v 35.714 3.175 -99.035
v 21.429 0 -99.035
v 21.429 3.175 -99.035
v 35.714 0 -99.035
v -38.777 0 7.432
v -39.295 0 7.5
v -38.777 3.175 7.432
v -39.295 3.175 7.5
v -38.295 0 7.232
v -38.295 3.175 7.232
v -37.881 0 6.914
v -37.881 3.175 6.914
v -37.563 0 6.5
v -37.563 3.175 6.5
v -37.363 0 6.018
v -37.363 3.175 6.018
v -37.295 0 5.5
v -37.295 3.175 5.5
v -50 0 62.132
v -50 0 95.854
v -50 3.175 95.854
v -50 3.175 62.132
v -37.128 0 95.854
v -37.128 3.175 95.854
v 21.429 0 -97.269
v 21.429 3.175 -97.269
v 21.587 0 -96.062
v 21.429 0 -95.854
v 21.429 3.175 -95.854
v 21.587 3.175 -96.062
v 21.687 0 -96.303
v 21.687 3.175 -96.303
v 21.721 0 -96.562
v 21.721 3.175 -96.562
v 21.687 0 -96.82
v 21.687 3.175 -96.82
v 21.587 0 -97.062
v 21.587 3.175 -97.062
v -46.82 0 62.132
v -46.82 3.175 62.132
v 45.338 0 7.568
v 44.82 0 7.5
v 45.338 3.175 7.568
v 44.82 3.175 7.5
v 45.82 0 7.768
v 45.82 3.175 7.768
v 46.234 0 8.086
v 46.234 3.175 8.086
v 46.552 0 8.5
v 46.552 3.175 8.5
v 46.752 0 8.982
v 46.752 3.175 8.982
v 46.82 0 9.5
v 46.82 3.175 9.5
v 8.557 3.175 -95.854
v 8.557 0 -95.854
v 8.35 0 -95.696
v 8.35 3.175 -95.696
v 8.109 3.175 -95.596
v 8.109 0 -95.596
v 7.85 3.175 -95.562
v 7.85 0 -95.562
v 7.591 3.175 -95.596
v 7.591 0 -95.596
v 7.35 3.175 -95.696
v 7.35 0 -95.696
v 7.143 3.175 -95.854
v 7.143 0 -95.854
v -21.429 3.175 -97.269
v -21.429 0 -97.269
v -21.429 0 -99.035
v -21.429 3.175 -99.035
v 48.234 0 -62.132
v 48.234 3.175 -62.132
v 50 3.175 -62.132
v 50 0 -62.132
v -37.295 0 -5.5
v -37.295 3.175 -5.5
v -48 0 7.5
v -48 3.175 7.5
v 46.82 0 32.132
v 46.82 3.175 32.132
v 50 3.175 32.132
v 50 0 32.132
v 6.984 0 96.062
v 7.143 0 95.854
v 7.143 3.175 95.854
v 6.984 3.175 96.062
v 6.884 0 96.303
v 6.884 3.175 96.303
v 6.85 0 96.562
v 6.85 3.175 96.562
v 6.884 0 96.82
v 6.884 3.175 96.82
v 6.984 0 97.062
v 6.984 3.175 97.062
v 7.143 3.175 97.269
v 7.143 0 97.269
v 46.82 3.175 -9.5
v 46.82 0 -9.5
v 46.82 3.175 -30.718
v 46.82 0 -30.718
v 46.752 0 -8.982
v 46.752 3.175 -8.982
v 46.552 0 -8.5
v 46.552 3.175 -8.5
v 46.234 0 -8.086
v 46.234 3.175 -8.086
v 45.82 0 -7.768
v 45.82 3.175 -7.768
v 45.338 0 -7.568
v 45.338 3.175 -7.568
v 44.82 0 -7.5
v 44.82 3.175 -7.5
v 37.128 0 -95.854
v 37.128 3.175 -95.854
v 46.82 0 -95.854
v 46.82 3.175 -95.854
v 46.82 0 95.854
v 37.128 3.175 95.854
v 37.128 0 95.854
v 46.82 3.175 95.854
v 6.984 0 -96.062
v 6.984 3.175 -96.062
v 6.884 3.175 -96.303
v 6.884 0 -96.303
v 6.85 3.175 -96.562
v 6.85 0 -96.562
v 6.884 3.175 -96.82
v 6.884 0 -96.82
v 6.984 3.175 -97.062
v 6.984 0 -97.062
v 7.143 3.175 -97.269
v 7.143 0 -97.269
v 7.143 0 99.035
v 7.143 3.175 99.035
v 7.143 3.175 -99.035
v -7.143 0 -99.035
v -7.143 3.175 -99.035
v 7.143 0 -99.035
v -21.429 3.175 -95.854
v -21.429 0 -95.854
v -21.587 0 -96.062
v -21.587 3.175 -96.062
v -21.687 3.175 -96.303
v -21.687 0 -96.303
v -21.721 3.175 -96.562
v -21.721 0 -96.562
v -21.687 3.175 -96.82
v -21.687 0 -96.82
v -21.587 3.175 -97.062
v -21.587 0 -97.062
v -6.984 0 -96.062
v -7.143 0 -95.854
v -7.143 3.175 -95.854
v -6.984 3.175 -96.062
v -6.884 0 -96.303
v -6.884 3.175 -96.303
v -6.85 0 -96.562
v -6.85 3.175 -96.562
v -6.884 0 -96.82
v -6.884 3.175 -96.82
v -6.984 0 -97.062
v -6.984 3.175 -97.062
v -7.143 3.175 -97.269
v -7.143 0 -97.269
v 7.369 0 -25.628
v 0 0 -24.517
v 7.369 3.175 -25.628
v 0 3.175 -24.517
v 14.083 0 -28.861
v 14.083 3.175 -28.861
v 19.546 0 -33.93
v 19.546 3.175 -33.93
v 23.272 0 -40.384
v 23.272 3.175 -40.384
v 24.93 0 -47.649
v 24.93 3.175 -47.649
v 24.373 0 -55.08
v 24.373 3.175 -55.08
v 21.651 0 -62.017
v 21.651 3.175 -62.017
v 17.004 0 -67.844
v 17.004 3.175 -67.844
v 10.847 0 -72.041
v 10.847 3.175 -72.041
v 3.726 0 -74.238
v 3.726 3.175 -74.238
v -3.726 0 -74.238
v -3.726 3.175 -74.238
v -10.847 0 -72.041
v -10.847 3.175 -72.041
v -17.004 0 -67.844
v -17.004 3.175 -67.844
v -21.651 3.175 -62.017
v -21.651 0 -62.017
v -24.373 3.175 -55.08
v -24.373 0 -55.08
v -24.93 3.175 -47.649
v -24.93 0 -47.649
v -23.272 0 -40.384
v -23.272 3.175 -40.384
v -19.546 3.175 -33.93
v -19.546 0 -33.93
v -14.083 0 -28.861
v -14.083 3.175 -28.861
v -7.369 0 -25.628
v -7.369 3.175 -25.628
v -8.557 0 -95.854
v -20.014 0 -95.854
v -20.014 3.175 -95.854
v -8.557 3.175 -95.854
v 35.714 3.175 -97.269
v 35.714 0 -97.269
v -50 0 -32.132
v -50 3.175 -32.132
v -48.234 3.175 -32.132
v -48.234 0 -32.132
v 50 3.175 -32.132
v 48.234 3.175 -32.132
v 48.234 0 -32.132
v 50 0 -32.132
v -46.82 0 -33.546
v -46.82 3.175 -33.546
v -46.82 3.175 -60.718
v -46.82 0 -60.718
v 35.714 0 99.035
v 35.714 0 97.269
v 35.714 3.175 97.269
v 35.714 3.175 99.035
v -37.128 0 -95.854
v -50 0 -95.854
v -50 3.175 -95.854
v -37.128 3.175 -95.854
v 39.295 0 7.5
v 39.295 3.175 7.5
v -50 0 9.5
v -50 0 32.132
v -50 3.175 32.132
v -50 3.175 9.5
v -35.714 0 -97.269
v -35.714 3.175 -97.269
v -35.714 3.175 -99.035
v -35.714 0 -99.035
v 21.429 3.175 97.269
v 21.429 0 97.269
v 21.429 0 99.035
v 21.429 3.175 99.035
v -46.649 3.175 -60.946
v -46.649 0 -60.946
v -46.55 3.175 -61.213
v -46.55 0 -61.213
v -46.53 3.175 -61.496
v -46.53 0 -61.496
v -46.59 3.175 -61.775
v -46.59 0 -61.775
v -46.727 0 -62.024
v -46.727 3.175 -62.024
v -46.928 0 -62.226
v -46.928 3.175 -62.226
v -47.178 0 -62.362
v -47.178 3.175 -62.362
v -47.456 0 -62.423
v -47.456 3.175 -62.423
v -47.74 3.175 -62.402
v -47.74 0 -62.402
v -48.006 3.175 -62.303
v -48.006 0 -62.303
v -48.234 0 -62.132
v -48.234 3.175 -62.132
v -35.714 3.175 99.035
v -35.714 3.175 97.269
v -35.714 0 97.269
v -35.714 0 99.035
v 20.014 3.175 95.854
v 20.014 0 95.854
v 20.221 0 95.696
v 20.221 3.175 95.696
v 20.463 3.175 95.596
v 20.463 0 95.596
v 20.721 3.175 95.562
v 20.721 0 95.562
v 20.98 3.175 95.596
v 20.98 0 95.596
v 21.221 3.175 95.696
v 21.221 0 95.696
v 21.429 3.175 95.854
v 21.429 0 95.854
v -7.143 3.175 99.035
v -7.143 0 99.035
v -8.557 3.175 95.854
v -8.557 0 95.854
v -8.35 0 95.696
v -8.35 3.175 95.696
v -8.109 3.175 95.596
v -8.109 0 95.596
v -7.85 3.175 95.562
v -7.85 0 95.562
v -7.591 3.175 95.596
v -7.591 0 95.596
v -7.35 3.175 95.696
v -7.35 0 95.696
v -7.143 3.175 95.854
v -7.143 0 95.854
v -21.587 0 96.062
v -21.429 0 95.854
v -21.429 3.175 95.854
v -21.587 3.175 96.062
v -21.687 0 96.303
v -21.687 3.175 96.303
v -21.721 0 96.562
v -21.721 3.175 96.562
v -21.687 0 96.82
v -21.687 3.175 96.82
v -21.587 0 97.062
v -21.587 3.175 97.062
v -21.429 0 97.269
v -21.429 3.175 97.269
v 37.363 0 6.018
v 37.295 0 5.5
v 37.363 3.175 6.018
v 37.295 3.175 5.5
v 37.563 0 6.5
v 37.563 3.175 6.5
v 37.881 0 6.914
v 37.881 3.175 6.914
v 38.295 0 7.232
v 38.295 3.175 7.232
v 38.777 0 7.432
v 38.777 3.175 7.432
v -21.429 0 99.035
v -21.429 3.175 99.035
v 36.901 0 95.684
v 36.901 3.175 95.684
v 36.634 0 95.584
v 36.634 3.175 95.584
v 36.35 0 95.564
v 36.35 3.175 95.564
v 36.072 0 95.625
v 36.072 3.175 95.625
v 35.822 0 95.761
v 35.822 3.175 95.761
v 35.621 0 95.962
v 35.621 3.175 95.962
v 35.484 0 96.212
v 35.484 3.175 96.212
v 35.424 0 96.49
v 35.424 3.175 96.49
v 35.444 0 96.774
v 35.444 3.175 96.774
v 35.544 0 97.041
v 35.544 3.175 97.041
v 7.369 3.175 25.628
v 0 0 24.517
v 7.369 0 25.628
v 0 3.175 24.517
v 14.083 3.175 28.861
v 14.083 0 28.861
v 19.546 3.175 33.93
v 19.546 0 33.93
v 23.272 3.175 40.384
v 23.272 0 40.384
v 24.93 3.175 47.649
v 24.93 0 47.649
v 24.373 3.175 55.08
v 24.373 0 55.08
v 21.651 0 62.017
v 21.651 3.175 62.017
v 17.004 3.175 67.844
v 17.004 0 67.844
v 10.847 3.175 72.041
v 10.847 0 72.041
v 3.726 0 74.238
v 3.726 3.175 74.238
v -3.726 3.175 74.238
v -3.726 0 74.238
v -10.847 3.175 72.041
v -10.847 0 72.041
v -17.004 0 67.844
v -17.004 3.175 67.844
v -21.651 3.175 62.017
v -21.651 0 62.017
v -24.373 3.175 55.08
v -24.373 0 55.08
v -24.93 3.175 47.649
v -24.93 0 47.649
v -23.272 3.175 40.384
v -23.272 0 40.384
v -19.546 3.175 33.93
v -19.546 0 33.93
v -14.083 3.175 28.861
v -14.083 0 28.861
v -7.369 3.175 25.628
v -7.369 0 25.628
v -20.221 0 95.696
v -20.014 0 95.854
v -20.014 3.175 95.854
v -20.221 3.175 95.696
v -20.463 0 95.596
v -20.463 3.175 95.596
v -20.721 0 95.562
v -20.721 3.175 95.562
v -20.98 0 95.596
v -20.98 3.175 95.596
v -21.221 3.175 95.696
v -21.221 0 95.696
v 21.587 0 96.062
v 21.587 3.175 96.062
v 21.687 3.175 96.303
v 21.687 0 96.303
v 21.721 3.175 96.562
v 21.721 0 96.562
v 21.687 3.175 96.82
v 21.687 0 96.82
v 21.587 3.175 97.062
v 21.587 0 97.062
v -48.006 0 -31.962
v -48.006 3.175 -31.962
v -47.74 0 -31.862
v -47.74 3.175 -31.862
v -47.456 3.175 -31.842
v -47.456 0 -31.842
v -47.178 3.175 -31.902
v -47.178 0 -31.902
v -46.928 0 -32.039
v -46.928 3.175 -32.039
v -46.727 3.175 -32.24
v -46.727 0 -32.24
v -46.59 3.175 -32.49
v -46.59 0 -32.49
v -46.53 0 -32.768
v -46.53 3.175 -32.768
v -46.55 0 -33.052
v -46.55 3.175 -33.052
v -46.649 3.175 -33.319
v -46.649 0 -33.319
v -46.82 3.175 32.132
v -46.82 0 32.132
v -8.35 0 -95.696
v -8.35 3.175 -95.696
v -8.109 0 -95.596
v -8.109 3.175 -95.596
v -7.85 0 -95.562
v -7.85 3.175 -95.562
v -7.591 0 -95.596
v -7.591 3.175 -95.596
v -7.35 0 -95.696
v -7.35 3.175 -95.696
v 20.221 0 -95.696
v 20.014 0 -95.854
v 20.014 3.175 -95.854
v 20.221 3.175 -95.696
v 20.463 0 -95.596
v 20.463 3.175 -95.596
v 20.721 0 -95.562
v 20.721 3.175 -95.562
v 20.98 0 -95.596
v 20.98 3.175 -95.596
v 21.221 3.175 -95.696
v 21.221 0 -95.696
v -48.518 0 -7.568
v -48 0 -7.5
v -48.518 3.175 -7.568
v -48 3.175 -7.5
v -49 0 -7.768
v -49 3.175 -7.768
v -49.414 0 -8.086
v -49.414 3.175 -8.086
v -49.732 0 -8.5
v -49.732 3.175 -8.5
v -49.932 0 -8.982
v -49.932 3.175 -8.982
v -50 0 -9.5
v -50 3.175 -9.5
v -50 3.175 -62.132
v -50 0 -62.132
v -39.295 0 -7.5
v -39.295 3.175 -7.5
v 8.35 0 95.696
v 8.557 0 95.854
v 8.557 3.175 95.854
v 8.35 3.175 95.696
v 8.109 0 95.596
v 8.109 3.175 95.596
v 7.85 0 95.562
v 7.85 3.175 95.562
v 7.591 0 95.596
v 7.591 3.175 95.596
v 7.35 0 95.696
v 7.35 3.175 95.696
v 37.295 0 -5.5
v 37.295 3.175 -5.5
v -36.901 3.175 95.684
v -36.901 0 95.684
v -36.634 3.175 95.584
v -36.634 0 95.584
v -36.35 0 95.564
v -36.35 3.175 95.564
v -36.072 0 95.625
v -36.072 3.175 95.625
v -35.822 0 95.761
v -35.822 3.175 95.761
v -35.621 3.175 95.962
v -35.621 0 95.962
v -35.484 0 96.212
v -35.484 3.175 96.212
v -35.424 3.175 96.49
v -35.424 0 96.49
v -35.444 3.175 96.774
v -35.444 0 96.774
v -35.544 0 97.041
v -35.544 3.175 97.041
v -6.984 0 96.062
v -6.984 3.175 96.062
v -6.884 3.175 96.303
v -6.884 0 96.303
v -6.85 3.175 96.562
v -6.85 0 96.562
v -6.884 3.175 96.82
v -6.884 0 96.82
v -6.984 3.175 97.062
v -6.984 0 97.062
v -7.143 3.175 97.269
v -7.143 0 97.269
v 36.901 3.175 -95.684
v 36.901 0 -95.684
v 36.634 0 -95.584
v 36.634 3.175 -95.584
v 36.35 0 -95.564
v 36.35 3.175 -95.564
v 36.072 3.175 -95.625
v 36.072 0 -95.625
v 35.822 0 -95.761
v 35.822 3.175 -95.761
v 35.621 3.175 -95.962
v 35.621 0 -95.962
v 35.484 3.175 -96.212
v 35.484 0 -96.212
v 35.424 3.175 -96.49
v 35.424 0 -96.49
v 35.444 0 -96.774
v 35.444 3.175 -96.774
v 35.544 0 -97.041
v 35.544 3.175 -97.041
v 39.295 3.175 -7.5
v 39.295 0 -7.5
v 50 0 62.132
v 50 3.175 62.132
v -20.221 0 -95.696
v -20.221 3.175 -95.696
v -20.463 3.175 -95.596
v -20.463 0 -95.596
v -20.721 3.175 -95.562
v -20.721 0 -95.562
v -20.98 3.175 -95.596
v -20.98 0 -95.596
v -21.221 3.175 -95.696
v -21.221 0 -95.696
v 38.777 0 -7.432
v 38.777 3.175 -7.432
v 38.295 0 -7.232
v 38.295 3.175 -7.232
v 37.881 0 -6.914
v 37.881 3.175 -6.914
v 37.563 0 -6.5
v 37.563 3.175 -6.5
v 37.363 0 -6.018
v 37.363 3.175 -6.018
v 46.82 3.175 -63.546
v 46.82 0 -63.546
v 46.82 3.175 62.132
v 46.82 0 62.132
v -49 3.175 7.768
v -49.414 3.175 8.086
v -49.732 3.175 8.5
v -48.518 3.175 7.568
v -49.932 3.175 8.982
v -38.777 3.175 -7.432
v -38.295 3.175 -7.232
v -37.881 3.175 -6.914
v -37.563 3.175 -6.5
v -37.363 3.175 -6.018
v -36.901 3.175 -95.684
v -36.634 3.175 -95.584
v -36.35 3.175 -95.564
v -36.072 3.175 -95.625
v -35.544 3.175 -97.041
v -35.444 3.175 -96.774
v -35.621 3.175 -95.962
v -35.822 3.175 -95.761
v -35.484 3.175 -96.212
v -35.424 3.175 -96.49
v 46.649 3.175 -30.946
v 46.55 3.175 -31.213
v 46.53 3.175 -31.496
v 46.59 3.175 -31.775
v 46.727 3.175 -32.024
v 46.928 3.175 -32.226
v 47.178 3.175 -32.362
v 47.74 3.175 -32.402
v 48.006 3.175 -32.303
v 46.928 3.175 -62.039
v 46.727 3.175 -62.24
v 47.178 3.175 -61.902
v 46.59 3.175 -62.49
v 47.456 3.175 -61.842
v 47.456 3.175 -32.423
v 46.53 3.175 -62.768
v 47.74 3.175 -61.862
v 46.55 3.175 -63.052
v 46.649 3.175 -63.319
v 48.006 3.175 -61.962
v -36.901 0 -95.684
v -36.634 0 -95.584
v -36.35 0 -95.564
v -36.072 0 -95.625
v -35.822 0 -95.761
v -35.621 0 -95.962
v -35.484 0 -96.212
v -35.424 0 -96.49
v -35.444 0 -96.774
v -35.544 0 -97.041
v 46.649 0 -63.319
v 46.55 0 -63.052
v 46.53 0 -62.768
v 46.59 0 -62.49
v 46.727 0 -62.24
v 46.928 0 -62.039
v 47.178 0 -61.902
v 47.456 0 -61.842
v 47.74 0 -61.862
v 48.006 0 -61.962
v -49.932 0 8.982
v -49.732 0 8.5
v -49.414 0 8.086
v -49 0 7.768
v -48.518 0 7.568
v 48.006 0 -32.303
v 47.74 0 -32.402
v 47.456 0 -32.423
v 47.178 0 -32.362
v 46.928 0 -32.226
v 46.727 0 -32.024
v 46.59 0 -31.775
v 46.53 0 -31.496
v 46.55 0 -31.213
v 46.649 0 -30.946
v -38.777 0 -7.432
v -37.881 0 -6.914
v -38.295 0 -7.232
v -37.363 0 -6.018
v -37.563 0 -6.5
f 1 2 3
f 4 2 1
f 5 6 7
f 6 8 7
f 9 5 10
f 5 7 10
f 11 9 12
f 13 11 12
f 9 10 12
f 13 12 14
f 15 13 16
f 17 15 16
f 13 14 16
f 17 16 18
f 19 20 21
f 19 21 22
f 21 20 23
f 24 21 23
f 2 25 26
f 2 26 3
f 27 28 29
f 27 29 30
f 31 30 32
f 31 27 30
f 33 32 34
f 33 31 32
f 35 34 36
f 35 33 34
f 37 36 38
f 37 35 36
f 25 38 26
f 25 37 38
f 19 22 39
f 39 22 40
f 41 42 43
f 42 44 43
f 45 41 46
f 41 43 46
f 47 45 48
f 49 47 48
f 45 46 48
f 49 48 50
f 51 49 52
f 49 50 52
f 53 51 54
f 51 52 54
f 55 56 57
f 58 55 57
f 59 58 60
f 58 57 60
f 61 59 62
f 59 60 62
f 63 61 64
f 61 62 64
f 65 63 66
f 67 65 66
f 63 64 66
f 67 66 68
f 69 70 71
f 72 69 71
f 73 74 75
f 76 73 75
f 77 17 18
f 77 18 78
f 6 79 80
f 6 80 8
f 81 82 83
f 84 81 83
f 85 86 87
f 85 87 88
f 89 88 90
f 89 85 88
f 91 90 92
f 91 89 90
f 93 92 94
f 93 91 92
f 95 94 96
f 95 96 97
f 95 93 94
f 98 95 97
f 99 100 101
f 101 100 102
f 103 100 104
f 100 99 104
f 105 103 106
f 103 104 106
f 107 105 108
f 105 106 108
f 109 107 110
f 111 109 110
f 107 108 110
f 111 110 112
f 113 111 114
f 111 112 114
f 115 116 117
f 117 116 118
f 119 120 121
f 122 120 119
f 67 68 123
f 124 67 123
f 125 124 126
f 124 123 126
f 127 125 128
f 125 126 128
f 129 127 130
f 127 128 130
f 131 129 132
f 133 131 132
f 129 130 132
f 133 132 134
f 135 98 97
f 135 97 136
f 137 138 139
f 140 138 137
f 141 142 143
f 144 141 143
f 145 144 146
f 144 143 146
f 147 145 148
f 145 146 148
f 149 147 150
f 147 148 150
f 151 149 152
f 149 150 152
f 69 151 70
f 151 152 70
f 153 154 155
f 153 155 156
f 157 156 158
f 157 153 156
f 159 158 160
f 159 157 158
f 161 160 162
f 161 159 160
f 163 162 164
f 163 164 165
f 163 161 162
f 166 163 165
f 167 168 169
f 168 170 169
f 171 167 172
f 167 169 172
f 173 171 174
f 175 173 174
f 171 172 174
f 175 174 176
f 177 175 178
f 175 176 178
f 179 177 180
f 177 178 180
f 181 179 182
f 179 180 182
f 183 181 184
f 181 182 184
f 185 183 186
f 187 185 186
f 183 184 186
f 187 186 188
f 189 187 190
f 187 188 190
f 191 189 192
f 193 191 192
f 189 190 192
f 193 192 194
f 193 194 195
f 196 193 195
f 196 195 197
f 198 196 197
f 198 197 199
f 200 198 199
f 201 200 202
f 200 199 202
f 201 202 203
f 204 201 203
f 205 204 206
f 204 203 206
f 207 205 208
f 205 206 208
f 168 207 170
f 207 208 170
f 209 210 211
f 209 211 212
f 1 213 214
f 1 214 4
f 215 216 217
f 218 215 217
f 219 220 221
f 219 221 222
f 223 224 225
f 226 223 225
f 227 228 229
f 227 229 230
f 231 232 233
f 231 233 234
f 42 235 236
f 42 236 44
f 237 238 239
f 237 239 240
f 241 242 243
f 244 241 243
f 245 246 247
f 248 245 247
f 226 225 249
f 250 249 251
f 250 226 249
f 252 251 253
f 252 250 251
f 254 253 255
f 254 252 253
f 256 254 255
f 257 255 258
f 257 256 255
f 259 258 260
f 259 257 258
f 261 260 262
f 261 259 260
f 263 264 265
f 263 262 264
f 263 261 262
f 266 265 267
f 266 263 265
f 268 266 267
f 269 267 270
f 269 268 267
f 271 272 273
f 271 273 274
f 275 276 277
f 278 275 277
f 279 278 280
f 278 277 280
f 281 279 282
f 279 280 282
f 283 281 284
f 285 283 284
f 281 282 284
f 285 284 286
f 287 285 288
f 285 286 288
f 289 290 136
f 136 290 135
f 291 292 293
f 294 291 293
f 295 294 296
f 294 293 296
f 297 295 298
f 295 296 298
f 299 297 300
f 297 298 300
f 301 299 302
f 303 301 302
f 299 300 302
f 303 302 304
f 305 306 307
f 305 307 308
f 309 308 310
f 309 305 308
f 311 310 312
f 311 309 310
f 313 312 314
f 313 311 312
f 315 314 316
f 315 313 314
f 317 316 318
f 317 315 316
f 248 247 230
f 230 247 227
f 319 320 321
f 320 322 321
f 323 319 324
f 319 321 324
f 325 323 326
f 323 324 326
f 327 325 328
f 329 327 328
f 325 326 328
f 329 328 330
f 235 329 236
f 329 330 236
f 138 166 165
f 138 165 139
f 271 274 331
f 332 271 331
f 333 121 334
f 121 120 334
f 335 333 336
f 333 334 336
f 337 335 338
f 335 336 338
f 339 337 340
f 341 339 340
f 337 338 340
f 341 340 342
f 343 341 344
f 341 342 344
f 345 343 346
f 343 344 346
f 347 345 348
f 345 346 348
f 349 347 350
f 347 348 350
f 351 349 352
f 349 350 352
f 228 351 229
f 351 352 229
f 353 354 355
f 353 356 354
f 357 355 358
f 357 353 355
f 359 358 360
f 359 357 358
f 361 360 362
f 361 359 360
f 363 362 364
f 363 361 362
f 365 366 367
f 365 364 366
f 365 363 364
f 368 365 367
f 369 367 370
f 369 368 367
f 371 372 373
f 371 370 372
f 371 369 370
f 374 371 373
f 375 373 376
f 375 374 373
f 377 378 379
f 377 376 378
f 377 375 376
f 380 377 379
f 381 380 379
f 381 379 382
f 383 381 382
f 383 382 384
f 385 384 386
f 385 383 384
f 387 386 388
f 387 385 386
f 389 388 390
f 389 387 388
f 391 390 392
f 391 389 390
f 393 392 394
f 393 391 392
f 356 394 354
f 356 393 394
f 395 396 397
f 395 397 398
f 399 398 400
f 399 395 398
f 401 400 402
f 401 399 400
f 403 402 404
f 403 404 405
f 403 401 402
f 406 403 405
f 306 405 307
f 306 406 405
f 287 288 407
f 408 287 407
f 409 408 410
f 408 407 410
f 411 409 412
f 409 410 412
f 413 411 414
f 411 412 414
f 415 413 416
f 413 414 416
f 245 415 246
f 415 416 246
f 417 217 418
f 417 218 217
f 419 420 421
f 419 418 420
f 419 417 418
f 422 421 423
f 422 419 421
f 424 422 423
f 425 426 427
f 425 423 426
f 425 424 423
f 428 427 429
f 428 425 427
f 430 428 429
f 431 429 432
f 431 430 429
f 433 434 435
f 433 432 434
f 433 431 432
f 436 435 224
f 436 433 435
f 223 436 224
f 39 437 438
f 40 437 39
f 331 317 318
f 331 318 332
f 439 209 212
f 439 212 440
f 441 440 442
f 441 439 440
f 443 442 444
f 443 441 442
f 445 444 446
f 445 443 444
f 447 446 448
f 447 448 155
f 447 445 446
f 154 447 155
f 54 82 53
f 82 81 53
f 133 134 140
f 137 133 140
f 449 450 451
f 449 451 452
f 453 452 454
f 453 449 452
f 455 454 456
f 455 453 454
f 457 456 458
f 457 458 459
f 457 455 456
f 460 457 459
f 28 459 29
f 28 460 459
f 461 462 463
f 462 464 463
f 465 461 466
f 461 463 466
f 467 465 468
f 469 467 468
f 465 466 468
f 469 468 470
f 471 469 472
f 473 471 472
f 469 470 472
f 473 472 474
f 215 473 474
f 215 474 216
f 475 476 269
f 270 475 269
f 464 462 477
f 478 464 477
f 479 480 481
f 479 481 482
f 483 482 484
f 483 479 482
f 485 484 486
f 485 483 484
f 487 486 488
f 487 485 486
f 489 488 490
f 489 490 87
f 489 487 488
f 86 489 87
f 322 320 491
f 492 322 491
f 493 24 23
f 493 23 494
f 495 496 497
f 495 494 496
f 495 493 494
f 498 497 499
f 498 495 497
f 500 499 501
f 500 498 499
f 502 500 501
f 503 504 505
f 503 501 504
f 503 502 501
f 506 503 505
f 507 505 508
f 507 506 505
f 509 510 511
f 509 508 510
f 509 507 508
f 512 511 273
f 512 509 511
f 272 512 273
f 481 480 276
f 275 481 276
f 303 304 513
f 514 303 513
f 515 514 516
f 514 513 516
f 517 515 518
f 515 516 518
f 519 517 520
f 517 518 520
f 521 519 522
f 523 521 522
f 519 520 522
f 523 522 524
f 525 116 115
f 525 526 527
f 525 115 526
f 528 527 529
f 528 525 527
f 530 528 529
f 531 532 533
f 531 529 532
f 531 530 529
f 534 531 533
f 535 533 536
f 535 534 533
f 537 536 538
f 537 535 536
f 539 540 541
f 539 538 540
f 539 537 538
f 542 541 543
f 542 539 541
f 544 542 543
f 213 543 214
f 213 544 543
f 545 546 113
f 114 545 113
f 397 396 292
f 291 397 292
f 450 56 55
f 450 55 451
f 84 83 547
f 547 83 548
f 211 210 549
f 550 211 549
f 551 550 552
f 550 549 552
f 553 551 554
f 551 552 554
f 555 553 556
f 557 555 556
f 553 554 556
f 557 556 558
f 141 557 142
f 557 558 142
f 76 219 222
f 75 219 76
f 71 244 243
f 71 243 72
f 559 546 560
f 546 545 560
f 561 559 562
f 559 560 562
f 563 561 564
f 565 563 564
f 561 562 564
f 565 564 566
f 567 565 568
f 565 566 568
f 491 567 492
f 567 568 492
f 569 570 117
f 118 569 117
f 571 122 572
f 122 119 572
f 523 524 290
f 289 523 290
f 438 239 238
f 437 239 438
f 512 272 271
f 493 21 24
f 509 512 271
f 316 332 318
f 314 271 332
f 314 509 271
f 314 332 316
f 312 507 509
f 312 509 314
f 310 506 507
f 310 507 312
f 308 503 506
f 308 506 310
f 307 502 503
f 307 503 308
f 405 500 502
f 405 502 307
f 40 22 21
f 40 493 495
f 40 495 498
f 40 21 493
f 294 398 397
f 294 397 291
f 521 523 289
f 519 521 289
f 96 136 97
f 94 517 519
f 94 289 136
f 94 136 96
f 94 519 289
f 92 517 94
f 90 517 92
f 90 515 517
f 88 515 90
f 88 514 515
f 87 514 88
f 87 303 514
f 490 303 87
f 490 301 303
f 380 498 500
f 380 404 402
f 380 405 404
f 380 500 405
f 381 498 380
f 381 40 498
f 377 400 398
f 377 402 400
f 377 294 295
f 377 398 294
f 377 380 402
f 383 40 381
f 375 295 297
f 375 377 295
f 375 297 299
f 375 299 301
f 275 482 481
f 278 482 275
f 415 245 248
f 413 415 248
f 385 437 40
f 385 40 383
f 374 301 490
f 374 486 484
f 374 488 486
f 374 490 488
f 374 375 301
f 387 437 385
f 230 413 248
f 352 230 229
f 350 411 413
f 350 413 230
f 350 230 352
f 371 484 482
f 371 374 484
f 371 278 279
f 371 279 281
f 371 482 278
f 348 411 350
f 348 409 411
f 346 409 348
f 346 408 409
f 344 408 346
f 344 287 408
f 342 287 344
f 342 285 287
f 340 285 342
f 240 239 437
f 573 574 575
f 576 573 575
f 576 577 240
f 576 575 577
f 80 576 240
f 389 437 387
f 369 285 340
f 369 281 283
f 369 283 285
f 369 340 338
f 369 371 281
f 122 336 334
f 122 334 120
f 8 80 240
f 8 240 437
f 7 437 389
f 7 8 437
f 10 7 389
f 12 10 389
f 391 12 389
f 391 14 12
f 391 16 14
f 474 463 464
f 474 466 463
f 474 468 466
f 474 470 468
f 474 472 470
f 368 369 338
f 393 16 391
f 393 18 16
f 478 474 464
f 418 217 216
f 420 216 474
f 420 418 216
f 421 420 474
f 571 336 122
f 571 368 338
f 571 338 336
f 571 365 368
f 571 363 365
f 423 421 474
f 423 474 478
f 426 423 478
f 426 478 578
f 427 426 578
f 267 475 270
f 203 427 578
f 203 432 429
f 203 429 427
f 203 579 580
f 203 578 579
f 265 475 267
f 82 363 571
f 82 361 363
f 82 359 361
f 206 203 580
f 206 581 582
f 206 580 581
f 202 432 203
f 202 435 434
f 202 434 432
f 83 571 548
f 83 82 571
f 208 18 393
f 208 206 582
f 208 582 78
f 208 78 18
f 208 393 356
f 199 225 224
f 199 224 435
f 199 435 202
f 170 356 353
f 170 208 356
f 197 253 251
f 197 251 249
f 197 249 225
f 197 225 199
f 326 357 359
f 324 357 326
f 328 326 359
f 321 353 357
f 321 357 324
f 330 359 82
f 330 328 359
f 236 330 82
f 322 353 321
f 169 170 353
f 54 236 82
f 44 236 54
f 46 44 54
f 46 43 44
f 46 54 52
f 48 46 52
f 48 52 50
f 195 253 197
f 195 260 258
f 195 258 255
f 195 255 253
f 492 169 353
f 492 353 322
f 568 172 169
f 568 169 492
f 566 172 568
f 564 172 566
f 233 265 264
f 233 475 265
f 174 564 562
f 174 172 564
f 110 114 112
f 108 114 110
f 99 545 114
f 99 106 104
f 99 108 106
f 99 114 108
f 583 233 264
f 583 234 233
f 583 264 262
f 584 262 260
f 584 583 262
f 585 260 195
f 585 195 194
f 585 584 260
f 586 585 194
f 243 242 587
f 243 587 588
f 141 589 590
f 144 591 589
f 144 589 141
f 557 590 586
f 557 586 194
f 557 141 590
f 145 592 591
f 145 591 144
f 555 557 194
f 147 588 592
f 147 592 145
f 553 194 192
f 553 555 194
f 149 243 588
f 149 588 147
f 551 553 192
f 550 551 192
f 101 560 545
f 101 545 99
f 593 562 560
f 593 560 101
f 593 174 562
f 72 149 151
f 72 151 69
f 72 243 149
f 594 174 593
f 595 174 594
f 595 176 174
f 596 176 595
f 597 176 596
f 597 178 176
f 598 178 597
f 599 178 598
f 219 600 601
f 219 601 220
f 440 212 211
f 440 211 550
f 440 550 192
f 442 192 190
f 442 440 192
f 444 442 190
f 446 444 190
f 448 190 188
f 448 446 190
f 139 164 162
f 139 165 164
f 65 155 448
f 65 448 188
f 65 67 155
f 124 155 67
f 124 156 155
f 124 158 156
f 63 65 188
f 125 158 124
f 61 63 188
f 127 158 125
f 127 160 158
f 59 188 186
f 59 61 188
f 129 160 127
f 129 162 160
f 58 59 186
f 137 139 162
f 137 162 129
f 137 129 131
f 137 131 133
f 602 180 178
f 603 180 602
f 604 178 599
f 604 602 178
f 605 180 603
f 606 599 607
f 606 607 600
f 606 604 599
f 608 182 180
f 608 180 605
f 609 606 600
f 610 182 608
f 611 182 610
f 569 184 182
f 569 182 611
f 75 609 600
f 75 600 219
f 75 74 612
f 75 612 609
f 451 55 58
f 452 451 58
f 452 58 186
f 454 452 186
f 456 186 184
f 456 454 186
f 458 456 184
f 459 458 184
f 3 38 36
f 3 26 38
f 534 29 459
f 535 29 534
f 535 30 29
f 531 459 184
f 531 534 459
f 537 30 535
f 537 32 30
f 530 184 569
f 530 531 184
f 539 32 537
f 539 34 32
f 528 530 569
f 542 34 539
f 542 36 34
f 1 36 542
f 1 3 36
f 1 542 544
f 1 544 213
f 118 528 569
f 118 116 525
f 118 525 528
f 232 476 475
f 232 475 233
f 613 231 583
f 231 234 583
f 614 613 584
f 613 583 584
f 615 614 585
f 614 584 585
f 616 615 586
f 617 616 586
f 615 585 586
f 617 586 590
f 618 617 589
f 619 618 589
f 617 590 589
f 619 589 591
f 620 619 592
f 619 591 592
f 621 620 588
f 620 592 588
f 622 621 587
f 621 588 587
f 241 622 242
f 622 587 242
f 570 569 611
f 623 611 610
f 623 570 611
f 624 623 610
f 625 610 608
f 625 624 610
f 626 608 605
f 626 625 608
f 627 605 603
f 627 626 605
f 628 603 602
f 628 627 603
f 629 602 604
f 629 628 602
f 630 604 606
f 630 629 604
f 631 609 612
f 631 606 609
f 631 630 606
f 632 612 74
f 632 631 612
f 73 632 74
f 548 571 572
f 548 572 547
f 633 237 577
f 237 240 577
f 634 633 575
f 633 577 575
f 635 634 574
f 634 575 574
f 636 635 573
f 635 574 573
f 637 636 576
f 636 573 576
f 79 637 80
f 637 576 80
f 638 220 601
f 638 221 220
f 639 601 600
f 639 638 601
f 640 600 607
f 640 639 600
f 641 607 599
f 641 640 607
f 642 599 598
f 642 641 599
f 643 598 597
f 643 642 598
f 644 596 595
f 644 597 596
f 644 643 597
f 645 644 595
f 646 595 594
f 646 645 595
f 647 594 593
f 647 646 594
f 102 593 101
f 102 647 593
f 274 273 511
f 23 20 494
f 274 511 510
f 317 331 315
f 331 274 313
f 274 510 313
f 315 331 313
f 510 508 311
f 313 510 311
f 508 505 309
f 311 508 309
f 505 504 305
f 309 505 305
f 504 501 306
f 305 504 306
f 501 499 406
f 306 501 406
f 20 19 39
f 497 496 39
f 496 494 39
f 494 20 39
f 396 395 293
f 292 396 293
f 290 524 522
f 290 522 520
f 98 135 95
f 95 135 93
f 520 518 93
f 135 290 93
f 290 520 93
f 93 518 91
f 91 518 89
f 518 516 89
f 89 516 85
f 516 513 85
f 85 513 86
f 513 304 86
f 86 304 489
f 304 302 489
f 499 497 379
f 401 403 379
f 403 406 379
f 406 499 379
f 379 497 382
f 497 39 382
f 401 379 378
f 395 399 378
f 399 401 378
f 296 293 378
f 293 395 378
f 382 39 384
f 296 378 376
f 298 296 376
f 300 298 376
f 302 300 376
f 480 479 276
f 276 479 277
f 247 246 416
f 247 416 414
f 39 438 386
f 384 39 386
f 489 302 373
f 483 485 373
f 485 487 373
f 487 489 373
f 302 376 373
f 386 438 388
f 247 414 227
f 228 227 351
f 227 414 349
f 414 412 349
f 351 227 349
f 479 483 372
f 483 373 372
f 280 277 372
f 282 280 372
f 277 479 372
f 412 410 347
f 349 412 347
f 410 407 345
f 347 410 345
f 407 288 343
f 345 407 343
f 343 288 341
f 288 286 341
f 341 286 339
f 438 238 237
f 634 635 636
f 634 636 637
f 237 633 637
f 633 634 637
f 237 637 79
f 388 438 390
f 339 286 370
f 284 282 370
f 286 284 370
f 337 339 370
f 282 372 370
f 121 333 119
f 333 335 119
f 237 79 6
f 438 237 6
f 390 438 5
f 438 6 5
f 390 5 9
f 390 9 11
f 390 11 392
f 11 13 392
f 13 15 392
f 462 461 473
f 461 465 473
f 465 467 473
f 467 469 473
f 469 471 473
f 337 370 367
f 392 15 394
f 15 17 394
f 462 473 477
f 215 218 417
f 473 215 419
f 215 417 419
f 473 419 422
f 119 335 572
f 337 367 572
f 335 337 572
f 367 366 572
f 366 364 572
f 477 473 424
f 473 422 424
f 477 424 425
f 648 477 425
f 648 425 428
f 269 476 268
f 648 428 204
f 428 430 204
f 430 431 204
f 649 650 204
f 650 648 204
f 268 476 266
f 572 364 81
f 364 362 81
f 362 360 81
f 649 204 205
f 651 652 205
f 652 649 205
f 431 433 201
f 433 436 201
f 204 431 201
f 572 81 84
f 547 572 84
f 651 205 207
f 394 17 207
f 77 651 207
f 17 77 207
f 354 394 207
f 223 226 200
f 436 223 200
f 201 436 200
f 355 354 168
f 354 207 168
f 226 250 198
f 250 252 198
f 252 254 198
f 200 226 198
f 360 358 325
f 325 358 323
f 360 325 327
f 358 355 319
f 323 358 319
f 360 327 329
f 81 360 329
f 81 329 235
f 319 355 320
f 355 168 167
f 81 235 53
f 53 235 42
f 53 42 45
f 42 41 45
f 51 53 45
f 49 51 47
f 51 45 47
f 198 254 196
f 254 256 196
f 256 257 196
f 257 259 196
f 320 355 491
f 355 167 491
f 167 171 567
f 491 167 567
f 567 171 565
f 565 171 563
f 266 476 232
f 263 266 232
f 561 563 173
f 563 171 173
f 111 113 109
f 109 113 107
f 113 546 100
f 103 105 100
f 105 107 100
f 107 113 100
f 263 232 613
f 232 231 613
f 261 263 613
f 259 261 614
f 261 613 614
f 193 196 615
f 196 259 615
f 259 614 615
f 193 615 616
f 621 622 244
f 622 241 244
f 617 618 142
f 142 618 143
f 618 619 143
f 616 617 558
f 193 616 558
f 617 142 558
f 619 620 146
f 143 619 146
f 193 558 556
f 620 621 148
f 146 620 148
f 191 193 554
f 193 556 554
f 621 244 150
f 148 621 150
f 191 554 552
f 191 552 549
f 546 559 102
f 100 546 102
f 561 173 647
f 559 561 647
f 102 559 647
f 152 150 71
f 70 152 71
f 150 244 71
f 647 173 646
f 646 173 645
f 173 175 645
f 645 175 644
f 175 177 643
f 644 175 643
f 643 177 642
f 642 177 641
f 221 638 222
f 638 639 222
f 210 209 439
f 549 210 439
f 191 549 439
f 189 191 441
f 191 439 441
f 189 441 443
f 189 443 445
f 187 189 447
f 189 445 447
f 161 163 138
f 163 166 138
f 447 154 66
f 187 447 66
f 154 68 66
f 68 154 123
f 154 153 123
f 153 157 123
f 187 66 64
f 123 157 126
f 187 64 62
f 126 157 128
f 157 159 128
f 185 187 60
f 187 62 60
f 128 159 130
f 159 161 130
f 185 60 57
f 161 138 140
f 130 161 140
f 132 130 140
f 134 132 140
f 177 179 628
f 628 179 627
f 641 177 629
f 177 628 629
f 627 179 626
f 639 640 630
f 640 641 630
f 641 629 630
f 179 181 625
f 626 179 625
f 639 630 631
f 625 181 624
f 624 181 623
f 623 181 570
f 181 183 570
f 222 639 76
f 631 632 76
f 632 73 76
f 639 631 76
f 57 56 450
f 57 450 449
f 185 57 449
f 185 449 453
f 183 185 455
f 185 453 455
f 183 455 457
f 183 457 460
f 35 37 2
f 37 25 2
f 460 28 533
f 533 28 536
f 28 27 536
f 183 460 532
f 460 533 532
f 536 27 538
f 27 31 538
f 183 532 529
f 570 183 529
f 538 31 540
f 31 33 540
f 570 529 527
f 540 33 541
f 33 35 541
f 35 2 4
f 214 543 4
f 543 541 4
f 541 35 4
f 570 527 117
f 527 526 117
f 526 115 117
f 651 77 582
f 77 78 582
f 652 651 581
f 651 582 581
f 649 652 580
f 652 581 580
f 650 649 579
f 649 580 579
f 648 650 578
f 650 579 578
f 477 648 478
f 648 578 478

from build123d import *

# Parameters (mm, degrees)
SKETCH1_W                 = 100
SKETCH1_H                 = 198.069
BOSS_EXTRUDE1_DEPTH       = 3.175
SKETCH2_W                 = 14.285714286
SKETCH2_H                 = 3.18
ENDSLOTS_DEPTH            = 111.986092891
GIVEUPCORNER_DEPTH        = 111.986092891
GIVEUPCORNER_DEPTH_BACK   = 111.986092891
SKETCH6_W                 = 3.18
SKETCH6_H                 = 194.889
SKETCH3_W                 = 3.18
SKETCH3_H                 = 30
BOSS_EXTRUDE2_DEPTH       = 3.175
SKETCH4_W                 = 3.18
SKETCH4_H                 = 30
CUT_EXTRUDE2_DEPTH        = 111.986092891
SKETCH7_R                 = 1
CUT_EXTRUDE5_DEPTH        = 111.986092891
SKETCH_PATTERN1_DEPTH     = 3.175
CUT_EXTRUDE6_DEPTH        = 111.986092891
CUT_EXTRUDE6_DEPTH_BACK   = 111.986092891
SKETCH9_R                 = 1
SKETCH10_R                = 25
WEIGHTCUTOUT_DEPTH        = 111.986092891
ZSYMMETRY_COPY_1_SKETCH_R = 1
ZSYMMETRY_COPY_1_DEPTH    = 111.986092891
ZSYMMETRY_COPY_2_DEPTH    = 3.175
ZIPTIESLOTS_DEPTH         = 111.986092891
ZIPTIESLOTS_DEPTH_BACK    = 111.986092891
SKETCH5_W                 = 9.525
SKETCH5_H                 = 15
SKETCH5_W_2               = 12.705
FILLET1_R                 = 2


# Read off the part's stored shape, not the designer's step: Sketch-Pattern1
with BuildPart() as part:
    # Sketch1 → Boss-Extrude1 (new body)
    with BuildSketch(Plane(origin=(0, 0, 0), x_dir=(1, 0, 0), z_dir=(0, 1, 0))):
        Rectangle(SKETCH1_W, SKETCH1_H)
    extrude(amount=BOSS_EXTRUDE1_DEPTH)

    # Sketch2 → endSlots (cut, symmetric)
    with BuildSketch(Plane(origin=(0, 3.175, 0), x_dir=(1, 0, 0), z_dir=(0, 1, 0))):
        with Locations((-42.857142857, 97.4445)):
            Rectangle(SKETCH2_W, SKETCH2_H)
        with Locations((-14.285714286, 97.4445)):
            Rectangle(SKETCH2_W, SKETCH2_H)
        with Locations((14.285714286, 97.4445)):
            Rectangle(SKETCH2_W, SKETCH2_H)
        with Locations((42.857142857, 97.4445)):
            Rectangle(SKETCH2_W, SKETCH2_H)
    endslots = extrude(amount=ENDSLOTS_DEPTH, both=True, mode=Mode.SUBTRACT)

    # Sketch6 → giveUpCorner (cut, two sides: drawn at the far end of the back side and taken through both)
    with BuildSketch(Plane(origin=(0, 3.175, 0), x_dir=(1, 0, 0), z_dir=(0, 1, 0)).offset(-GIVEUPCORNER_DEPTH_BACK)):
        with Locations((48.41, -1.59)):
            Rectangle(SKETCH6_W, SKETCH6_H)
    extrude(amount=GIVEUPCORNER_DEPTH + GIVEUPCORNER_DEPTH_BACK, mode=Mode.SUBTRACT)

    # Sketch3 → Boss-Extrude2 (add)
    with BuildSketch(Plane(origin=(0, 3.175, 0), x_dir=(1, 0, 0), z_dir=(0, 1, 0))):
        with Locations((48.41, 47.13225)):
            Rectangle(SKETCH3_W, SKETCH3_H)
    boss_extrude2 = extrude(amount=-BOSS_EXTRUDE2_DEPTH)

    # Sketch4 → Cut-Extrude2 (cut, symmetric)
    with BuildSketch(Plane(origin=(0, 3.175, 0), x_dir=(1, 0, 0), z_dir=(0, 1, 0))):
        with Locations((-48.41, 47.13225)):
            Rectangle(SKETCH4_W, SKETCH4_H)
    cut_extrude2 = extrude(amount=CUT_EXTRUDE2_DEPTH, both=True, mode=Mode.SUBTRACT)

    # Sketch7 → Cut-Extrude5 (cut, symmetric)
    with BuildSketch(Plane(origin=(0, 3.175, 0), x_dir=(1, 0, 0), z_dir=(0, 1, 0))):
        with Locations((-36.421392495, 96.561606781)):
            Circle(SKETCH7_R)
    cut_extrude5 = extrude(amount=CUT_EXTRUDE5_DEPTH, both=True, mode=Mode.SUBTRACT)

    # Sketch-Pattern1 outline → Sketch-Pattern1 (cut)
    with BuildSketch(Plane(origin=(0, 0, 0), x_dir=(1, 0, 0), z_dir=(0, 1, 0))):
        with BuildLine():
            Line((-7.142857143, 95.8545), (-8.557070705, 95.8545))
            ThreePointArc((-8.557070705, 95.8545), (-7.849963924, 95.561606781), (-7.142857143, 95.8545))
        make_face()
        with BuildLine():
            Line((-7.142857143, 97.268713562), (-7.142857143, 95.8545))
            ThreePointArc((-7.142857143, 95.8545), (-6.849963924, 96.561606781), (-7.142857143, 97.268713562))
        make_face()
        with BuildLine():
            Line((21.428571429, 95.8545), (20.014357866, 95.8545))
            ThreePointArc((20.014357866, 95.8545), (20.721464647, 95.561606781), (21.428571429, 95.8545))
        make_face()
        with BuildLine():
            Line((21.428571429, 97.268713562), (21.428571429, 95.8545))
            ThreePointArc((21.428571429, 95.8545), (21.721464648, 96.561606781), (21.428571429, 97.268713562))
        make_face()
    sketch_pattern1 = extrude(amount=SKETCH_PATTERN1_DEPTH, mode=Mode.SUBTRACT)

    # Mirror3: Cut-Extrude5, Sketch-Pattern1 across plane
    add(cut_extrude5.mirror(Plane(origin=(0, 0, 0), x_dir=(0, 0, 1), z_dir=(1, 0, 0))), mode=Mode.SUBTRACT)
    add(sketch_pattern1.mirror(Plane(origin=(0, 0, 0), x_dir=(0, 0, 1), z_dir=(1, 0, 0))), mode=Mode.SUBTRACT)

    # Sketch9 → Cut-Extrude6 (cut, two sides: drawn at the far end of the back side and taken through both)
    with BuildSketch(Plane(origin=(0, 3.175, 0), x_dir=(1, 0, 0), z_dir=(0, 1, 0)).offset(-CUT_EXTRUDE6_DEPTH_BACK)):
        with Locations((-47.527106781, 61.425143219)):
            Circle(SKETCH9_R)
        with Locations((47.527106781, 31.425143219)):
            Circle(SKETCH9_R)
        with Locations((47.527106781, 62.839356781)):
            Circle(SKETCH9_R)
        with Locations((-47.527106781, 32.839356781)):
            Circle(SKETCH9_R)
    extrude(amount=CUT_EXTRUDE6_DEPTH + CUT_EXTRUDE6_DEPTH_BACK, mode=Mode.SUBTRACT)

    # Sketch10 → weightCutout (cut, symmetric)
    with BuildSketch(Plane(origin=(0, 3.175, 0), x_dir=(1, 0, 0), z_dir=(0, 1, 0))):
        with Locations(Location((0, 49.51725, 0), (0, 0, 270))):
            Circle(SKETCH10_R)
    weightcutout = extrude(amount=WEIGHTCUTOUT_DEPTH, both=True, mode=Mode.SUBTRACT)

    # zSymmetry: endSlots, Boss-Extrude2, Cut-Extrude2, Cut-Extrude5, Sketch-Pattern1, weightCutout across plane
    add(endslots.mirror(Plane.XY), mode=Mode.SUBTRACT)
    add(boss_extrude2.mirror(Plane.XY))
    add(cut_extrude2.mirror(Plane.XY), mode=Mode.SUBTRACT)
    add(cut_extrude5.mirror(Plane.XY), mode=Mode.SUBTRACT)
    add(sketch_pattern1.mirror(Plane.XY), mode=Mode.SUBTRACT)
    add(weightcutout.mirror(Plane.XY), mode=Mode.SUBTRACT)

    # zSymmetry copy 1 sketch → zSymmetry copy 1 (cut, symmetric)
    with BuildSketch(Plane(origin=(0, 3.175, 0), x_dir=(-1, 0, 0), z_dir=(0, 1, 0))):
        with Locations((-36.421392495, 96.561606781)):
            Circle(ZSYMMETRY_COPY_1_SKETCH_R)
    extrude(amount=ZSYMMETRY_COPY_1_DEPTH, both=True, mode=Mode.SUBTRACT)

    # zSymmetry copy 2 sketch → zSymmetry copy 2 (cut)
    with BuildSketch(Plane(origin=(0, 0, 0), x_dir=(-1, 0, 0), z_dir=(0, 1, 0))):
        with BuildLine():
            Line((-7.142857143, 95.8545), (-8.557070705, 95.8545))
            ThreePointArc((-8.557070705, 95.8545), (-7.849963924, 95.561606781), (-7.142857143, 95.8545))
        make_face()
        with BuildLine():
            Line((-7.142857143, 97.268713562), (-7.142857143, 95.8545))
            ThreePointArc((-7.142857143, 95.8545), (-6.849963924, 96.561606781), (-7.142857143, 97.268713562))
        make_face()
        with BuildLine():
            Line((21.428571429, 95.8545), (20.014357866, 95.8545))
            ThreePointArc((20.014357866, 95.8545), (20.721464647, 95.561606781), (21.428571429, 95.8545))
        make_face()
        with BuildLine():
            Line((21.428571429, 97.268713562), (21.428571429, 95.8545))
            ThreePointArc((21.428571429, 95.8545), (21.721464648, 96.561606781), (21.428571429, 97.268713562))
        make_face()
    extrude(amount=ZSYMMETRY_COPY_2_DEPTH, mode=Mode.SUBTRACT)

    # Sketch5 → zipTieSlots (cut, two sides: drawn at the far end of the back side and taken through both)
    with BuildSketch(Plane(origin=(0, 3.175, 0), x_dir=(1, 0, 0), z_dir=(0, 1, 0)).offset(-ZIPTIESLOTS_DEPTH_BACK)):
        with Locations((42.0575, 0)):
            Rectangle(SKETCH5_W, SKETCH5_H)
        with Locations((-43.6475, 0)):
            Rectangle(SKETCH5_W_2, SKETCH5_H)
    extrude(amount=ZIPTIESLOTS_DEPTH + ZIPTIESLOTS_DEPTH_BACK, mode=Mode.SUBTRACT)

    # Fillet1
    fillet1_edges = [part.edges().sort_by_distance(p)[0] for p in [
        (46.82, 1.5875, -7.5),
        (46.82, 1.5875, 7.5),
        (37.295, 1.5875, 7.5),
        (37.295, 1.5875, -7.5),
        (-50, 1.5875, 7.5),
        (-50, 1.5875, -7.5),
        (-37.295, 1.5875, -7.5),
        (-37.295, 1.5875, 7.5),
    ]]
    fillet(fillet1_edges, radius=FILLET1_R)


solid = part.part
